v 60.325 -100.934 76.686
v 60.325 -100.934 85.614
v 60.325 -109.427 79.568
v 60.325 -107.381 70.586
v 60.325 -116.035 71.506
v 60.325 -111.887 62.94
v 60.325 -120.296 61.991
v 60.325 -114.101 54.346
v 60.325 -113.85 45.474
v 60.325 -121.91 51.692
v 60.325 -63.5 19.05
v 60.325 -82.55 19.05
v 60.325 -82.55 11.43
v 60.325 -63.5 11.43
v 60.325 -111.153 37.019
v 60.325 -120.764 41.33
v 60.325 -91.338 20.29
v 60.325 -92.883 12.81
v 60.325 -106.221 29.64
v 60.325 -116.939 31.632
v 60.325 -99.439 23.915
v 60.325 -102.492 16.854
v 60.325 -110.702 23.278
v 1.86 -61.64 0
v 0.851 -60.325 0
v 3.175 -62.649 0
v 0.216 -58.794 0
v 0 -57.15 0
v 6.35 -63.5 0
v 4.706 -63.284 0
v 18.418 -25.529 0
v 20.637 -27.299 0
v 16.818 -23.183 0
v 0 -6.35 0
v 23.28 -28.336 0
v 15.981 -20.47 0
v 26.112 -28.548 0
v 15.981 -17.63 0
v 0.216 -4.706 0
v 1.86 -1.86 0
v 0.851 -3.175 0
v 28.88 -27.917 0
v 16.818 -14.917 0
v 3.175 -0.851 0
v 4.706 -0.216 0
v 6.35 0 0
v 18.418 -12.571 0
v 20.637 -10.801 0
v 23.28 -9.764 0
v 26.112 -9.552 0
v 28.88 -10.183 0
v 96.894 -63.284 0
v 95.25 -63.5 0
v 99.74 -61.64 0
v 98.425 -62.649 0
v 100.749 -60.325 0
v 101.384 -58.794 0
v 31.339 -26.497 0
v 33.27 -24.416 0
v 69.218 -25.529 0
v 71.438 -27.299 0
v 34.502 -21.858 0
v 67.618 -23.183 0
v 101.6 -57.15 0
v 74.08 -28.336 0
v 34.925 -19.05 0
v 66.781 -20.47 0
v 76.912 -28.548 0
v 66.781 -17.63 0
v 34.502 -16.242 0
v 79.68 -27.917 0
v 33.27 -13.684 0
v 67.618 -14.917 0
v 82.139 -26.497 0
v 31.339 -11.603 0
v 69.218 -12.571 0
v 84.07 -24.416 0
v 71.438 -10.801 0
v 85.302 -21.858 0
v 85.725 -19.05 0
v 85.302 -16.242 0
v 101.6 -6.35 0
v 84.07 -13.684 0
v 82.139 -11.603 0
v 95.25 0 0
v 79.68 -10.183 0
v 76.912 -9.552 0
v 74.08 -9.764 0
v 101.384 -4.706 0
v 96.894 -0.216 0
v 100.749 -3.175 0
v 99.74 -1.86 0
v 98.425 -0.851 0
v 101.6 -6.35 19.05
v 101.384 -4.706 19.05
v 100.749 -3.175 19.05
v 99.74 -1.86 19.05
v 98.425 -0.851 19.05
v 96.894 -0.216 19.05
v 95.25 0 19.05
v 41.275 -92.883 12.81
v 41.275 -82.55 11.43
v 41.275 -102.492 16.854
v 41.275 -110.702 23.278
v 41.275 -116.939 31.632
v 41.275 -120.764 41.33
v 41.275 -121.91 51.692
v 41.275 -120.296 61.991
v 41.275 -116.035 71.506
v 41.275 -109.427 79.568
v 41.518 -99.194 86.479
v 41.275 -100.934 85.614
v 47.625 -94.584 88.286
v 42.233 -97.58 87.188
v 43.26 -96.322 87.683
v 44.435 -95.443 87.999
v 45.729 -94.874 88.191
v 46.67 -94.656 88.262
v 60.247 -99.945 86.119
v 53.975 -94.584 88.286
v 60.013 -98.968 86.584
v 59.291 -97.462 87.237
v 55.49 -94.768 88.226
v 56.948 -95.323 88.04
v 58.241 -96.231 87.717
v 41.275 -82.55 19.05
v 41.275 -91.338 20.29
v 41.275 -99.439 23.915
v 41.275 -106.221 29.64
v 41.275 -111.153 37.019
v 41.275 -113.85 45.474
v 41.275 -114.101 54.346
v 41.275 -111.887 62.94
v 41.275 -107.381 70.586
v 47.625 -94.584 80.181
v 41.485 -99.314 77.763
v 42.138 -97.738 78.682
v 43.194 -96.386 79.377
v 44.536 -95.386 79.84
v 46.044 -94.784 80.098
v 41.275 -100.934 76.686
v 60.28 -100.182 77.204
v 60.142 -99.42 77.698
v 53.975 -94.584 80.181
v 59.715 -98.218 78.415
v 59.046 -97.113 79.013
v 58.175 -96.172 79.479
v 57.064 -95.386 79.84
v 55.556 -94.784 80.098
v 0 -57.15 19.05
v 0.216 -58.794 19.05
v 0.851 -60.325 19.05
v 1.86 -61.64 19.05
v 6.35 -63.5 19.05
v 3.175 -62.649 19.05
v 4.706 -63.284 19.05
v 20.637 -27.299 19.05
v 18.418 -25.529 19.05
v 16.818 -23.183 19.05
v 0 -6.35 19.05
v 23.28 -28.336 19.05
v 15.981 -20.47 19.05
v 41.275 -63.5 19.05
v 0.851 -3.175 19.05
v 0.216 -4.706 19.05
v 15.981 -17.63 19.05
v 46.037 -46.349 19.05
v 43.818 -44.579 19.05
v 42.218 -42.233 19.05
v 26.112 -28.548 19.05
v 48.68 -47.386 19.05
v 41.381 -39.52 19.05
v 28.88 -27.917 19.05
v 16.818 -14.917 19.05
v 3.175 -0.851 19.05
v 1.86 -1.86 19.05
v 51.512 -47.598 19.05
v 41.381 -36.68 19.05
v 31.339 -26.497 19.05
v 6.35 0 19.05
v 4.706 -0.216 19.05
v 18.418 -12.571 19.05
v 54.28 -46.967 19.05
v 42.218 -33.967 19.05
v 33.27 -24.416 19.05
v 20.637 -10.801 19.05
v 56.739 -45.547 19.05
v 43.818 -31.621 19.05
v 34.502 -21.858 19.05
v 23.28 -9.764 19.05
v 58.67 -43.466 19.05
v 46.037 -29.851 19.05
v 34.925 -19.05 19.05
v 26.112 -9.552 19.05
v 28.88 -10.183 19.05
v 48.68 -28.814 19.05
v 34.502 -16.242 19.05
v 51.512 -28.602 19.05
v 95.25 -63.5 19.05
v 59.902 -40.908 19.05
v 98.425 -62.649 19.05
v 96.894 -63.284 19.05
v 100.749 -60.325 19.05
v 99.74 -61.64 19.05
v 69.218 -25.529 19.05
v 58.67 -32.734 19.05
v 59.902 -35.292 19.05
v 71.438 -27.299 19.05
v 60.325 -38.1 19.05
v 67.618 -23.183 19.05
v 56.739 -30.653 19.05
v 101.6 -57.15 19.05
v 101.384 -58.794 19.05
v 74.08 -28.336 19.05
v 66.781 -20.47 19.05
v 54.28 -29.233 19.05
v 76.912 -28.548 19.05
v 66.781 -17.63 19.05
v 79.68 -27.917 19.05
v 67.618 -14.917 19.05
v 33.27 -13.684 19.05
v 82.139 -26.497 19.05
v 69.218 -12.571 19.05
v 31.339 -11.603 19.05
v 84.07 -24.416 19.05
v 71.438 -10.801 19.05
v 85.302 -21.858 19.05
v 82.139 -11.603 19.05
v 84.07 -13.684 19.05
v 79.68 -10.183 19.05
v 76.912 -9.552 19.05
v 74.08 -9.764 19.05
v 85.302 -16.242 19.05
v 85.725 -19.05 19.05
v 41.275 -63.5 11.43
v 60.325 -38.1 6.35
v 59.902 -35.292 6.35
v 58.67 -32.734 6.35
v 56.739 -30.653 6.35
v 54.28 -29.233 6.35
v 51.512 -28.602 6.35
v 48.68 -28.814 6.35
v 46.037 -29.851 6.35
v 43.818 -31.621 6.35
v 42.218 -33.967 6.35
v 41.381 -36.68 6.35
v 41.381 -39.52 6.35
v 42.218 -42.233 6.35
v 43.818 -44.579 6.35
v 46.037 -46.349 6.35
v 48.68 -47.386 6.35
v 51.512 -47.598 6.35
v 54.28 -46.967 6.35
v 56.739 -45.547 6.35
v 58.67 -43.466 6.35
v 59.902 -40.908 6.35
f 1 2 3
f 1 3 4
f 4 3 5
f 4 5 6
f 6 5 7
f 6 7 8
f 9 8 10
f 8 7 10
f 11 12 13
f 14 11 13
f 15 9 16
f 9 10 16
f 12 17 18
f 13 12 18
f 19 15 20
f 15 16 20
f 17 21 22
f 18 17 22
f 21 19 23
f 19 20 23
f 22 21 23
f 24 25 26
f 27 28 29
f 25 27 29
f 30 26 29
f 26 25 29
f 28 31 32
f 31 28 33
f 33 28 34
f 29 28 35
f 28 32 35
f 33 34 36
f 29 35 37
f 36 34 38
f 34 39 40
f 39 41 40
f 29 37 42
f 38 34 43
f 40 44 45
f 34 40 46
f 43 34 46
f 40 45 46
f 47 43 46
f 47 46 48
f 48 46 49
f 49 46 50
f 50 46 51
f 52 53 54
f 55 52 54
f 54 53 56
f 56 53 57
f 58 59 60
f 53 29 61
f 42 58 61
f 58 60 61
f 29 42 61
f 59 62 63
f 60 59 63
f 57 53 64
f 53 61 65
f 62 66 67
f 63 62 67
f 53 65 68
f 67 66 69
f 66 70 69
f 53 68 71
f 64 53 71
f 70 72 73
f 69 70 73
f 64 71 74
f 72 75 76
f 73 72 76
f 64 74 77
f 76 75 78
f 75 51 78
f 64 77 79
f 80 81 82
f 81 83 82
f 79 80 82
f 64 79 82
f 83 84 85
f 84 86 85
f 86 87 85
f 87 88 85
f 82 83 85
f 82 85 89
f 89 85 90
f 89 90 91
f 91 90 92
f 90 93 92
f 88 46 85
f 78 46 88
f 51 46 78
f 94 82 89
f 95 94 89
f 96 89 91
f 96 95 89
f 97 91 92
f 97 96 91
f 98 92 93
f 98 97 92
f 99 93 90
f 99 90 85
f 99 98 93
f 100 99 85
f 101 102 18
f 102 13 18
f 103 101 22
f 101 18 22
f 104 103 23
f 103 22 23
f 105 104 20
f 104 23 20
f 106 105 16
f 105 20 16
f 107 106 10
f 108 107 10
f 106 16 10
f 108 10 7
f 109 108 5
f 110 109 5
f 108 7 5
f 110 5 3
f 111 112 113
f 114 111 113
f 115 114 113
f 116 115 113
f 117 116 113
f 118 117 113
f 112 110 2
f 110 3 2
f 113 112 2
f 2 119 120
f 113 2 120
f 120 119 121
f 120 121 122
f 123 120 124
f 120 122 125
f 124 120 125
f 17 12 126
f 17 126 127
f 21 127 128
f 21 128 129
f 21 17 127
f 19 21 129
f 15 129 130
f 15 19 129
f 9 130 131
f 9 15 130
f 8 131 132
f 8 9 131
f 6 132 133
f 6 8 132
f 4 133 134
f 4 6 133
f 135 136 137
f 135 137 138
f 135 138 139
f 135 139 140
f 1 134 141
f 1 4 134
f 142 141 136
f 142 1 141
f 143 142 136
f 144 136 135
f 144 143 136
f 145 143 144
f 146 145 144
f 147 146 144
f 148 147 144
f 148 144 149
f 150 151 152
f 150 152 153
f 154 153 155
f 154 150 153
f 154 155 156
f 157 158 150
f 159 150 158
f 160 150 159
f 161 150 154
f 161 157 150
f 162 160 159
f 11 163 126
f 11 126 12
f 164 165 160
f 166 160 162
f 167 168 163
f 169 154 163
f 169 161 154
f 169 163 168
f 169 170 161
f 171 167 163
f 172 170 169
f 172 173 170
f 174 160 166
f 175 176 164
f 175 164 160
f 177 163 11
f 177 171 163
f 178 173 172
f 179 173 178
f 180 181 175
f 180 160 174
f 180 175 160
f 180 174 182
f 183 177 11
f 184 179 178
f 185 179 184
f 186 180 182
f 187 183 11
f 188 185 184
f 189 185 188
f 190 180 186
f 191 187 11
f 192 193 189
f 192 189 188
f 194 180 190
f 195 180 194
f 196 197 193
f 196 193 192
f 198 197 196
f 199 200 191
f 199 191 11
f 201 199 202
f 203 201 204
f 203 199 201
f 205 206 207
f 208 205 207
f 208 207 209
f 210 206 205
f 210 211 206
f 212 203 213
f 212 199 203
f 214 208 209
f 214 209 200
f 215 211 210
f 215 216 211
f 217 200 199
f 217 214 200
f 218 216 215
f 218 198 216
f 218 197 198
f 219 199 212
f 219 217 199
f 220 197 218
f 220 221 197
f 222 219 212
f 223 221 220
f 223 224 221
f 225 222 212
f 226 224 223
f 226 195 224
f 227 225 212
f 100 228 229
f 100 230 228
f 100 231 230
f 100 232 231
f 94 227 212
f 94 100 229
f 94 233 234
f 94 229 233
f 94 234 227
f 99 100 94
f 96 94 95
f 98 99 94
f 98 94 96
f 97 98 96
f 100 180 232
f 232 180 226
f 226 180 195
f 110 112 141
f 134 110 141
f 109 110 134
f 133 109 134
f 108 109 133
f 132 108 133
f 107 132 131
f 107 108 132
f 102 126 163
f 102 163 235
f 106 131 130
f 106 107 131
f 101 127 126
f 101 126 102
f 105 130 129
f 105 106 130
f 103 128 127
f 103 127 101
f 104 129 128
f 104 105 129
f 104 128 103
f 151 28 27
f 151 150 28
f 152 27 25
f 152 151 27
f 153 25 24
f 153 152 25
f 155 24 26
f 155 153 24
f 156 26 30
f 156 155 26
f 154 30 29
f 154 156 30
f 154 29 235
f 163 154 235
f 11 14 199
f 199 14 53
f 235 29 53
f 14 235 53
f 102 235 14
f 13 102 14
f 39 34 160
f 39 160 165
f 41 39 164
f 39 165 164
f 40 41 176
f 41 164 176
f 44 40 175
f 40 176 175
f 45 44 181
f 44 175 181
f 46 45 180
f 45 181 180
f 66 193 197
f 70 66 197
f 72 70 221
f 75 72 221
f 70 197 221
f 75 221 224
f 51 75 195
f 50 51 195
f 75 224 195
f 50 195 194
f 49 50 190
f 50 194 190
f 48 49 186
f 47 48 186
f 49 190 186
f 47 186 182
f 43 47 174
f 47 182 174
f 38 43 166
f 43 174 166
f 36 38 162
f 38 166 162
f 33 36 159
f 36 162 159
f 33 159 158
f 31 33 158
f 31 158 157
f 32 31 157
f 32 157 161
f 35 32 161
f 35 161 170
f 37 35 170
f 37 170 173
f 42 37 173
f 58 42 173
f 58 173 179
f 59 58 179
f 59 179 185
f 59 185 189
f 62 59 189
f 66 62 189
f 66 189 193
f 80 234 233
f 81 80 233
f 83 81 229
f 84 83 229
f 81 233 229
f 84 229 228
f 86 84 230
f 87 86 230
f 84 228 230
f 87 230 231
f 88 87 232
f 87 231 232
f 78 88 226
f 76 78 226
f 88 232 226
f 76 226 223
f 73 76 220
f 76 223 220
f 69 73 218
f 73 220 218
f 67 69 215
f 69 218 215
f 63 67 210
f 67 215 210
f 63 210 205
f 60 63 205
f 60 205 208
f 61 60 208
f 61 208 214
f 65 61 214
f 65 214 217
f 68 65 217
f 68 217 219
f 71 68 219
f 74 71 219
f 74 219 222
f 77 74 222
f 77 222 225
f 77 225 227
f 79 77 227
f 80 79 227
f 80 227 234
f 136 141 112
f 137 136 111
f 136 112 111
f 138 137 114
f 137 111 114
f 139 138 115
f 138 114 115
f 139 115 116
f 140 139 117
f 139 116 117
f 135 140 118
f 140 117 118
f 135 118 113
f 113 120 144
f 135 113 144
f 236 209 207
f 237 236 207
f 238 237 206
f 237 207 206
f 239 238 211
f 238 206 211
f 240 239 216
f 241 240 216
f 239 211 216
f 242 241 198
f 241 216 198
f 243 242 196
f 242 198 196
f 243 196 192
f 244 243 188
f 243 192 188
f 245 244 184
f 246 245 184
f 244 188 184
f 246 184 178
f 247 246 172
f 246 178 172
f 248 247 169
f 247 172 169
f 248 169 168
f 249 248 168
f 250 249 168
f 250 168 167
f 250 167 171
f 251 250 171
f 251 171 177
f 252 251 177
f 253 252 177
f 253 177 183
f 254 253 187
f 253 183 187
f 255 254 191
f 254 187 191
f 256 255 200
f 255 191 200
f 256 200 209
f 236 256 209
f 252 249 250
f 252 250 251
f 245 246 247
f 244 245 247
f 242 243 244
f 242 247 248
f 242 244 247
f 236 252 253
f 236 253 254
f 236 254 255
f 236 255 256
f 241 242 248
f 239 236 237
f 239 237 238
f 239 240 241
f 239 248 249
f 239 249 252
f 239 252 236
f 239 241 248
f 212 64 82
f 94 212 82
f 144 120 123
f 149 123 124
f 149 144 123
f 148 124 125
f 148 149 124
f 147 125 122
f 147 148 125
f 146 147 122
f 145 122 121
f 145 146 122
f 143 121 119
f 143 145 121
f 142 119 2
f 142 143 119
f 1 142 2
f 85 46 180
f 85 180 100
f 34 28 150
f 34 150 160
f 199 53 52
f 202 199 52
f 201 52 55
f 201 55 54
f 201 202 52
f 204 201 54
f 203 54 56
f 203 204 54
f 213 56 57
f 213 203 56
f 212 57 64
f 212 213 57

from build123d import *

# Parameters (mm, degrees)
F0_W      = 101.6
F0_H      = 63.5
F1_DEPTH  = 19.05
F2_R      = 6.35
F3_R      = 9.525
F4_DEPTH  = 12.7
F5_DEPTH  = 19.051
F6_W      = 19.05
F6_H      = 7.62
F7_DEPTH  = 19.05
F8_W      = 19.05
F8_H      = 7.62
F9_ANGLE  = 162.2017998475
F11_DEPTH = 25.4
F12_R     = 6.35


with BuildPart() as f1:
    # F0 (on Top) → F1 (new body)
    with BuildSketch(Plane.XY):
        with Locations((50.8, -31.75)):
            Rectangle(F0_W, F0_H)
    extrude(amount=F1_DEPTH)

    # F2
    f2_edges = [f1.edges().sort_by_distance(p)[0] for p in [
        (101.6, -63.5, 9.525),
        (101.6, 0, 9.525),
        (0, -63.5, 9.525),
        (0, 0, 9.525),
    ]]
    fillet(f2_edges, radius=F2_R)

    # F3 (on face) → F4 (cut)
    with BuildSketch(Plane.XY.offset(19.05)):
        with Locations((50.8, -38.1)):
            Circle(F3_R)
    extrude(amount=-F4_DEPTH, mode=Mode.SUBTRACT)

    # F3 (on face) → F5 (cut, through all)
    with BuildSketch(Plane.XY.offset(19.05)):
        with Locations((25.4, -19.05)):
            Circle(F3_R)
        with Locations((76.2, -19.05)):
            Circle(F3_R)
    extrude(amount=-F5_DEPTH, mode=Mode.SUBTRACT)

    # F6 (on face) → F7 (join)
    with BuildSketch(Plane.XZ.offset(63.5)):
        with Locations((50.8, 15.24)):
            Rectangle(F6_W, F6_H)
    extrude(amount=F7_DEPTH)

    # F8 (on face) → F9 (revolve)
    with BuildSketch(Plane.XZ.offset(82.55)):
        with Locations((50.8, 15.24)):
            Rectangle(F8_W, F8_H)
    revolve(axis=Axis((50.8, -82.55, 50.8), (-1, 0, 0)), revolution_arc=F9_ANGLE)

    # F10 (on face) → F11 (cut)
    with BuildSketch(Plane.YZ.offset(60.325)):
        with BuildLine():
            Line((-94.5840466137, 88.2857122395), (-94.5840466137, 80.1810180576))
            ThreePointArc((-94.5840466137, 80.1810180576), (-93.4277552997, 80.6284585529), (-92.2548763014, 81.0304130963))
            Line((-92.2548763014, 81.0304130963), (-94.5840466137, 88.2857122395))
        make_face()
        with BuildLine():
            Line((-86.6367444396, 76.66990906), (-86.6367444396, 88.2857122395))
            Line((-86.6367444396, 88.2857122395), (-94.5840466137, 88.2857122395))
            Line((-94.5840466137, 88.2857122395), (-92.2548763014, 81.0304130963))
            ThreePointArc((-92.2548763014, 81.0304130963), (-93.4277552997, 80.6284585529), (-94.5840466137, 80.1810180576))
            Line((-94.5840466137, 80.1810180576), (-94.5840466137, 76.66990906))
            Line((-94.5840466137, 76.66990906), (-86.6367444396, 76.66990906))
        make_face()
    extrude(amount=-F11_DEPTH, mode=Mode.SUBTRACT)

    # F12
    f12_edges = [f1.edges().sort_by_distance(p)[0] for p in [
        (60.325, -94.584047, 84.233365),
        (41.275, -94.584047, 84.233365),
    ]]
    fillet(f12_edges, radius=F12_R)


solid = f1.part
